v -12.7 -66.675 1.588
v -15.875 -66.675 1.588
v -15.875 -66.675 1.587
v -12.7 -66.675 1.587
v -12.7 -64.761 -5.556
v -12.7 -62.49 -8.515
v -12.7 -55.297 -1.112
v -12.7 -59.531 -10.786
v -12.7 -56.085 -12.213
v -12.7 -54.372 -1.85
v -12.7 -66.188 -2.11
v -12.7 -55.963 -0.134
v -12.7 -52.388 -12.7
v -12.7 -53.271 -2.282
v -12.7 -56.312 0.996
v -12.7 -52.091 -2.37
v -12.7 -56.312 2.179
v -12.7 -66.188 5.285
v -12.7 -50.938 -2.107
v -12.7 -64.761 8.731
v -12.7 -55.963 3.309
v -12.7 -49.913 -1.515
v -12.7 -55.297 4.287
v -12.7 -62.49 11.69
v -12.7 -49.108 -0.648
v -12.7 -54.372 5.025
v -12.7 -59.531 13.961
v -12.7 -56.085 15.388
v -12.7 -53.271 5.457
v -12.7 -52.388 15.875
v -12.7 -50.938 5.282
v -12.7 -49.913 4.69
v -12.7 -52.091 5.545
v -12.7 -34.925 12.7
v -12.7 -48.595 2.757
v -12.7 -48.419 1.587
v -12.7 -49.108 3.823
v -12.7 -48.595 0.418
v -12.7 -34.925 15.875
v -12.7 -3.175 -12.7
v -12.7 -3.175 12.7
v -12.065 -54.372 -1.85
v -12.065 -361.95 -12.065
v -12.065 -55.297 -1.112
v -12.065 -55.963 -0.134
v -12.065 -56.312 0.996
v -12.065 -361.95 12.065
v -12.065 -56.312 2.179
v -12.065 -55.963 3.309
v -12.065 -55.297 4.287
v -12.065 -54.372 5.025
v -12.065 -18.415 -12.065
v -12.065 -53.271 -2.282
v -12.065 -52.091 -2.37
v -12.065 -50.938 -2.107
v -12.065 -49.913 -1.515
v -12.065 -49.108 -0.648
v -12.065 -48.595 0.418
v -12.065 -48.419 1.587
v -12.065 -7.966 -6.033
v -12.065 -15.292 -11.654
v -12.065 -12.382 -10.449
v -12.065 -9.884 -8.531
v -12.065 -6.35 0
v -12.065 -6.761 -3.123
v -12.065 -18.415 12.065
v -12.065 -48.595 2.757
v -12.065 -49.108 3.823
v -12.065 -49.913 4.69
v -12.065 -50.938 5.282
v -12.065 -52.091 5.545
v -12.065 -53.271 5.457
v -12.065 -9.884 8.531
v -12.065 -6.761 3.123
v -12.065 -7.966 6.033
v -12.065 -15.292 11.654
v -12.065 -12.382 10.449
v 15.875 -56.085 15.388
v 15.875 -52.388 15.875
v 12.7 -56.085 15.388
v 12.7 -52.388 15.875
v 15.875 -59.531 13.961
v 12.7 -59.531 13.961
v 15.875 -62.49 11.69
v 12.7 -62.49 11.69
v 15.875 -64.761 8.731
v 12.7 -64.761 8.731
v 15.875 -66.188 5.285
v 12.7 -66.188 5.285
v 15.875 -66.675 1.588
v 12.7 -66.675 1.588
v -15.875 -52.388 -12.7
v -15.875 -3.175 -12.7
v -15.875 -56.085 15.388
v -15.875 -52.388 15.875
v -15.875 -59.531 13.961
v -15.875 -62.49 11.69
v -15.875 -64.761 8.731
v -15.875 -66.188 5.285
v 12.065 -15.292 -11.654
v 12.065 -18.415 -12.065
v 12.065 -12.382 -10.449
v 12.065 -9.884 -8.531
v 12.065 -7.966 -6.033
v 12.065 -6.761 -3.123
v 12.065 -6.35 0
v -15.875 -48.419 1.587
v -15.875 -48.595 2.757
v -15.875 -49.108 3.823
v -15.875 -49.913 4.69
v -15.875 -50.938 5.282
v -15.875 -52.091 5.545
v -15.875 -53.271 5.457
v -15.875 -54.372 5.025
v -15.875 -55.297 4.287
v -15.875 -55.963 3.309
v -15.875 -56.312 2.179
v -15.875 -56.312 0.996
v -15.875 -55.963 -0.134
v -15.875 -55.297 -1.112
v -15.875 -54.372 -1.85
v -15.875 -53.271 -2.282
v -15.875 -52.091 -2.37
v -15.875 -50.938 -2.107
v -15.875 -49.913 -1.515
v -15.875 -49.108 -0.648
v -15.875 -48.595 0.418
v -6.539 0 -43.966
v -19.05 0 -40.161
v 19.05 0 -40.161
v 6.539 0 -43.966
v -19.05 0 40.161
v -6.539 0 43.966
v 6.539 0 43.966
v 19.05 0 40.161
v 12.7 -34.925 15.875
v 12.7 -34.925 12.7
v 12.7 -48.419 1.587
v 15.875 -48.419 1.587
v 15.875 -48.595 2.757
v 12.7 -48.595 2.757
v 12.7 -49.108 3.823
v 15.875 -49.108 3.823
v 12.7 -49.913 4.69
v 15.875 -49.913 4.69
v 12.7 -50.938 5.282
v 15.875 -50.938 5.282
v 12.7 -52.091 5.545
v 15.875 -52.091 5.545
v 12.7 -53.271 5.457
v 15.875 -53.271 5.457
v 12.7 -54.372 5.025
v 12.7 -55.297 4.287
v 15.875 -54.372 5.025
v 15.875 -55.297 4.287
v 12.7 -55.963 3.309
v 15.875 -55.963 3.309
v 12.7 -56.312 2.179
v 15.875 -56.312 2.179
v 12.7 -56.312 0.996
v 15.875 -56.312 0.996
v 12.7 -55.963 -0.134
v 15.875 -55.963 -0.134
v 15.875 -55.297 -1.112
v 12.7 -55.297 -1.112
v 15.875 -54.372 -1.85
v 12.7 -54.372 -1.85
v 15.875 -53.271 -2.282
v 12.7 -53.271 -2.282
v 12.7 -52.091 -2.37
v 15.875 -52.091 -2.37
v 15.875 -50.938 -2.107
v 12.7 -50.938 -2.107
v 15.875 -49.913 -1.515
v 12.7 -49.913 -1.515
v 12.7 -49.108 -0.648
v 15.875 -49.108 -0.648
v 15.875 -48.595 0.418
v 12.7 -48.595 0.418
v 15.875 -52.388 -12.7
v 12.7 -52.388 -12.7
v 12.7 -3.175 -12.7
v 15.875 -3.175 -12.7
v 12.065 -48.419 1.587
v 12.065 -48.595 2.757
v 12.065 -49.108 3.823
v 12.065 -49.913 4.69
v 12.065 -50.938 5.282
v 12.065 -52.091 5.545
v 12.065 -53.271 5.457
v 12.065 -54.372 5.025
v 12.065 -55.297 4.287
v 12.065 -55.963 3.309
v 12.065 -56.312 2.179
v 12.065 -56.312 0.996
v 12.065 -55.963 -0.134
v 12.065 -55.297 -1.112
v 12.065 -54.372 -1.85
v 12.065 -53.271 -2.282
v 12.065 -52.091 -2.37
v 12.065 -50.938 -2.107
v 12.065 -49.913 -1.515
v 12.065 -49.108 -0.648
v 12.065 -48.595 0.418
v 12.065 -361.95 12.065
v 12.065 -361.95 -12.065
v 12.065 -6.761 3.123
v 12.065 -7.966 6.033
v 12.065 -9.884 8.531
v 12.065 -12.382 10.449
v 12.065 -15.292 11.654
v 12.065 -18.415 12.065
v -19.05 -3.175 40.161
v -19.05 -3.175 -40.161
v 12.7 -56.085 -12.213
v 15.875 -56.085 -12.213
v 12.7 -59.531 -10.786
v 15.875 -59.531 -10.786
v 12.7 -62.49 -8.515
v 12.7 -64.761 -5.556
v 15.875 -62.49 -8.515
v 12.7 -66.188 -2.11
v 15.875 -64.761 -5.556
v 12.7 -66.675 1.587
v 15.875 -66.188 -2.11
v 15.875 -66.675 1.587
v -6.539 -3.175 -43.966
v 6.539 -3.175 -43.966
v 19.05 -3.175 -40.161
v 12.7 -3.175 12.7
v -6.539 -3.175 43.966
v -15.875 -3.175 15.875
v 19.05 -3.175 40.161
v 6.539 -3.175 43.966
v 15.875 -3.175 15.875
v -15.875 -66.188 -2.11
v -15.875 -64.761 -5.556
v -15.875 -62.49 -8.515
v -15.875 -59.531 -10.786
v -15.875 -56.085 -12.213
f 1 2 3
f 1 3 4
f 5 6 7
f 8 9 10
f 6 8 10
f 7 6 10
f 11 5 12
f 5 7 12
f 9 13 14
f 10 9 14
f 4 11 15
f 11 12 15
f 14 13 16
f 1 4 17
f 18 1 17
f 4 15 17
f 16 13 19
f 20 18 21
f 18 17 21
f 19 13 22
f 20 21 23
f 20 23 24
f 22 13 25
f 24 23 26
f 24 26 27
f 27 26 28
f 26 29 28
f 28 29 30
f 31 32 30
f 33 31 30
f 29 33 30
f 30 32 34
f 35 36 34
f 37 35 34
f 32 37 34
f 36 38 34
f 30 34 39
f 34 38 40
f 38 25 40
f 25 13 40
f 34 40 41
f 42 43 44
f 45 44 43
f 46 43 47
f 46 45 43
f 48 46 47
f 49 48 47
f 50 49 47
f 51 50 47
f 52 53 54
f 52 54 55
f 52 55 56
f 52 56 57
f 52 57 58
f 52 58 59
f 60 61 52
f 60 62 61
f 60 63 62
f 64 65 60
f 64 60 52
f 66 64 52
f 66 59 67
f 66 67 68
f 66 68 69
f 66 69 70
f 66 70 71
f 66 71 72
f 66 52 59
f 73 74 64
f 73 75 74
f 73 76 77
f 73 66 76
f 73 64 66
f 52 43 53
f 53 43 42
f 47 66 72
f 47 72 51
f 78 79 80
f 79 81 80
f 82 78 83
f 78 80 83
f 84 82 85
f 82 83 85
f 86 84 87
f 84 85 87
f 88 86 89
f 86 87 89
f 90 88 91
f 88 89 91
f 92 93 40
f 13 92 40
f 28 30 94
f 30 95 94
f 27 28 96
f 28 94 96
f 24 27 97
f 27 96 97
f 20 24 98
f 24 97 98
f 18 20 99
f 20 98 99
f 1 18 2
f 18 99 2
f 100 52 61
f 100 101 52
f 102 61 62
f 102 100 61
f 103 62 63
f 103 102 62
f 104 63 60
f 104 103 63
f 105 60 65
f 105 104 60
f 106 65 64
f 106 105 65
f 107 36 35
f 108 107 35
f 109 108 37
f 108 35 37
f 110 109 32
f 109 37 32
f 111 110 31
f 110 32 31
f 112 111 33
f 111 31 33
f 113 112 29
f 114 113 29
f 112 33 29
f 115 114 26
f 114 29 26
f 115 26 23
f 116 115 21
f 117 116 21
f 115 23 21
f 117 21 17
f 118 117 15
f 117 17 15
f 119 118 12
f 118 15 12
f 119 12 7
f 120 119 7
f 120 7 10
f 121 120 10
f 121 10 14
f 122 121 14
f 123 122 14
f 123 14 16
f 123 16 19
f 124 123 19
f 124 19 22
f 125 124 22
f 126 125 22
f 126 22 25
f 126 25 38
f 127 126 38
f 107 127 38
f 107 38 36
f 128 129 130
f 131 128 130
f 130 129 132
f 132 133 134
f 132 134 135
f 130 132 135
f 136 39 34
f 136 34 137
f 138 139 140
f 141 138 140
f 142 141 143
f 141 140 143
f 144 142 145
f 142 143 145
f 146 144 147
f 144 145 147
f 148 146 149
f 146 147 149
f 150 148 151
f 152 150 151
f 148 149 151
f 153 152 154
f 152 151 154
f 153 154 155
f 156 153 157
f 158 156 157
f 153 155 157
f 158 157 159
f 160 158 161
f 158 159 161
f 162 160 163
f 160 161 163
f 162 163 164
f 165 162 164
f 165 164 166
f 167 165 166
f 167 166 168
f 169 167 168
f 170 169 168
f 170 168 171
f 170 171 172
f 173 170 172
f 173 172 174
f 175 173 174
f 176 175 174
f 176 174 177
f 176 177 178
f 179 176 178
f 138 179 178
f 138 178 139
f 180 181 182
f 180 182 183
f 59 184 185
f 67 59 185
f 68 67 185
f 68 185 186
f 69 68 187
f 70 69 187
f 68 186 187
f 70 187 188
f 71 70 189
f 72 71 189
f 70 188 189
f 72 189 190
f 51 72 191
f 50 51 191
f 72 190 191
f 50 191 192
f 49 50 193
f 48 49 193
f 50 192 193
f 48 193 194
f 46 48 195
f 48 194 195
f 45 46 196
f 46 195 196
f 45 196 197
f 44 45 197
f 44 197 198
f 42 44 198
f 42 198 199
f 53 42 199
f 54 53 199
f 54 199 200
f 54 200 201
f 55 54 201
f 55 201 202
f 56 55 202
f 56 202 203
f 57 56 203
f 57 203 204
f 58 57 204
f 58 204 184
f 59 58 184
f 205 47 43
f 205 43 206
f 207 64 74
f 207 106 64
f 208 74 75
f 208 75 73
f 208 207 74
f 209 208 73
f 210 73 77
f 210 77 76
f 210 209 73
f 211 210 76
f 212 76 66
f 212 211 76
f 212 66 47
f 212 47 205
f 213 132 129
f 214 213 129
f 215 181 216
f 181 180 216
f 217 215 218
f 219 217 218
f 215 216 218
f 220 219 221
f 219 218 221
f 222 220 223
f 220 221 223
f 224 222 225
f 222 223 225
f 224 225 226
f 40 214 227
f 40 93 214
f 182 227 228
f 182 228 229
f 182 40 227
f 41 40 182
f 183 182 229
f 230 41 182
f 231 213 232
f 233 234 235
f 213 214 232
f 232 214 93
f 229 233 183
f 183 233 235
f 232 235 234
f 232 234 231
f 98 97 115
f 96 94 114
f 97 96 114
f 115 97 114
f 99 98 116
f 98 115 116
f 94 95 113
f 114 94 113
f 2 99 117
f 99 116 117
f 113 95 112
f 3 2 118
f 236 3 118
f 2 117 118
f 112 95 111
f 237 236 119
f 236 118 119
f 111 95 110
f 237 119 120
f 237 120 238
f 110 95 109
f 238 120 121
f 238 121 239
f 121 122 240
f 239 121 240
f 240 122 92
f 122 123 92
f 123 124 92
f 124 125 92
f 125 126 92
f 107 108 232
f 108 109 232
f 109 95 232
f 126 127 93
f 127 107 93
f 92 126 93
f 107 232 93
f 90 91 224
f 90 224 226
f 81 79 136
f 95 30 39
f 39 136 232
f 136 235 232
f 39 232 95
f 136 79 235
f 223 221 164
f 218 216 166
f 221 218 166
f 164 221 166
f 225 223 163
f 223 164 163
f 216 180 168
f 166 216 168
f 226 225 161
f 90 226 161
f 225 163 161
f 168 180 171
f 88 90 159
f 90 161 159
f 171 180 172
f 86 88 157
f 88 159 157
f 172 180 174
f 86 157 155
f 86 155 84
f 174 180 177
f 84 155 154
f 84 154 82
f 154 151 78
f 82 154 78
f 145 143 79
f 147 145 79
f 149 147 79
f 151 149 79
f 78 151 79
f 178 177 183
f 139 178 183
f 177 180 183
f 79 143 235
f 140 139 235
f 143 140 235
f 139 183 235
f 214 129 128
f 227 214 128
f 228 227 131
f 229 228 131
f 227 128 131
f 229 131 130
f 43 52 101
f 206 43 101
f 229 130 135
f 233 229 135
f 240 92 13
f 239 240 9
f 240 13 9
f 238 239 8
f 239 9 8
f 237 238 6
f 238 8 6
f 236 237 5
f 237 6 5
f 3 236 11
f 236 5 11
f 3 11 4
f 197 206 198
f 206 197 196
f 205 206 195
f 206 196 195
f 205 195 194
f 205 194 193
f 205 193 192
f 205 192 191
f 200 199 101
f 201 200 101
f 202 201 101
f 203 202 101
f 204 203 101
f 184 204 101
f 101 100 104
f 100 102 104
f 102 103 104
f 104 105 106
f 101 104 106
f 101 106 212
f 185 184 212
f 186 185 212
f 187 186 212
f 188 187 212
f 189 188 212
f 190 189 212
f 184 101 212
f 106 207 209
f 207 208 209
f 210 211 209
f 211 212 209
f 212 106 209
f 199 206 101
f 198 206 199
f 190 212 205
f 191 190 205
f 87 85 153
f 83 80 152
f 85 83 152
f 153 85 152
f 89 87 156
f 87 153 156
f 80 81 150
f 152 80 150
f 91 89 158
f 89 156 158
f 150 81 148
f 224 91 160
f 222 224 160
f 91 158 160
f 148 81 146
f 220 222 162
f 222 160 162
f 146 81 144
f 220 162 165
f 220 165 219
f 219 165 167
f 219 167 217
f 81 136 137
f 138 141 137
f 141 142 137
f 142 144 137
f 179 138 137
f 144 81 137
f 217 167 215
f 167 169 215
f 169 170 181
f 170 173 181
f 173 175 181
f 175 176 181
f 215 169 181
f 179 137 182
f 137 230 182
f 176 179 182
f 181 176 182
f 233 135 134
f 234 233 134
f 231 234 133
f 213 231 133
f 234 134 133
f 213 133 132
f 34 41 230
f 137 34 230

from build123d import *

# Parameters (mm, degrees)
F1_DEPTH  = 3.175
F3_DEPTH  = 31.75
F5_DEPTH  = 31.75
F6_R      = 14.28749
F8_D      = 7.9375
F8_DEPTH  = 50.8
F8_TIP    = 2.3846655818
F10_W     = 24.13
F10_H     = 24.13
F11_DEPTH = 355.6
F13_D     = 7.9375
F13_DEPTH = 50.8
F13_TIP   = 2.3846655818
F14_R     = 12.06499


# Not quite as in the source:
# - a fillet or chamfer is up to 0.001 mm smaller than in the source, because OpenCascade refuses the exact size


with BuildPart() as f1:
    # F0 (on Front) → F1 (new body)
    with BuildSketch(Plane.XZ):
        with BuildLine():
            Line((-19.05, 40.1609262841), (-19.05, -40.1609262841))
            ThreePointArc((-19.05, -40.1609262841), (0, -44.45), (19.05, -40.1609262841))
            Line((19.05, -40.1609262841), (19.05, 40.1609262841))
            ThreePointArc((19.05, 40.1609262841), (0, 44.45), (-19.05, 40.1609262841))
        make_face()
    extrude(amount=F1_DEPTH)

    # F2 (on face) → F3 (join)
    with BuildSketch(Plane.XZ.offset(3.175)):
        Polygon((-12.7, 12.7), (12.7, 12.7), (12.7, -12.7), (15.875, -12.7), (15.875, 15.875), (-15.875, 15.875), (-15.875, -12.7), (-12.7, -12.7), align=None)
    extrude(amount=F3_DEPTH)

    # F4 (on face) → F5 (join)
    with BuildSketch(Plane.XZ.offset(34.925)):
        Polygon((-12.7, 12.7), (-12.7, 15.875), (-15.875, 15.875), (-15.875, -12.7), (-12.7, -12.7), align=None)
        Polygon((15.875, 15.875), (12.7, 15.875), (12.7, 12.7), (12.7, -12.7), (15.875, -12.7), align=None)
    extrude(amount=F5_DEPTH)

    # F6 (radius 14.2875 in the source; OpenCascade refuses exactly that, so slightly less here)
    f6_edges = [f1.edges().sort_by_distance(p)[0] for p in [
        (-14.2875, -66.675, 15.875),
        (-14.2875, -66.675, -12.7),
        (14.2875, -66.675, -12.7),
        (14.2875, -66.675, 15.875),
    ]]
    fillet(f6_edges, radius=F6_R)

    # F8
    with Locations(Plane(origin=(-15.875, 0, 0), x_dir=(0, -1, 0), z_dir=(-1, 0, 0))):
        with Locations((52.3875, 1.5875)):
            Hole(F8_D / 2, depth=F8_DEPTH)
            with Locations((0, 0, -(F8_DEPTH + F8_TIP / 2))):  # 118° drill point
                Cone(0, F8_D / 2, F8_TIP, mode=Mode.SUBTRACT)


with BuildPart() as f11:
    # F10 (on offset) → F11 (new body)
    with BuildSketch(Plane.XZ.offset(6.35)):
        Rectangle(F10_W, F10_H)
    extrude(amount=F11_DEPTH)

    # F13
    with Locations(Plane(origin=(-12.065, 0, 0), x_dir=(0, -1, 0), z_dir=(-1, 0, 0))):
        with Locations((52.3875, 1.5875)):
            Hole(F13_D / 2, depth=F13_DEPTH)
            with Locations((0, 0, -(F13_DEPTH + F13_TIP / 2))):  # 118° drill point
                Cone(0, F13_D / 2, F13_TIP, mode=Mode.SUBTRACT)

    # F14 (radius 12.065 in the source; OpenCascade refuses exactly that, so slightly less here)
    f14_edges = [f11.edges().sort_by_distance(p)[0] for p in [
        (0, -6.35, 12.065),
        (0, -6.35, -12.065),
    ]]
    fillet(f14_edges, radius=F14_R)


solid = Compound([f1.part, f11.part])
